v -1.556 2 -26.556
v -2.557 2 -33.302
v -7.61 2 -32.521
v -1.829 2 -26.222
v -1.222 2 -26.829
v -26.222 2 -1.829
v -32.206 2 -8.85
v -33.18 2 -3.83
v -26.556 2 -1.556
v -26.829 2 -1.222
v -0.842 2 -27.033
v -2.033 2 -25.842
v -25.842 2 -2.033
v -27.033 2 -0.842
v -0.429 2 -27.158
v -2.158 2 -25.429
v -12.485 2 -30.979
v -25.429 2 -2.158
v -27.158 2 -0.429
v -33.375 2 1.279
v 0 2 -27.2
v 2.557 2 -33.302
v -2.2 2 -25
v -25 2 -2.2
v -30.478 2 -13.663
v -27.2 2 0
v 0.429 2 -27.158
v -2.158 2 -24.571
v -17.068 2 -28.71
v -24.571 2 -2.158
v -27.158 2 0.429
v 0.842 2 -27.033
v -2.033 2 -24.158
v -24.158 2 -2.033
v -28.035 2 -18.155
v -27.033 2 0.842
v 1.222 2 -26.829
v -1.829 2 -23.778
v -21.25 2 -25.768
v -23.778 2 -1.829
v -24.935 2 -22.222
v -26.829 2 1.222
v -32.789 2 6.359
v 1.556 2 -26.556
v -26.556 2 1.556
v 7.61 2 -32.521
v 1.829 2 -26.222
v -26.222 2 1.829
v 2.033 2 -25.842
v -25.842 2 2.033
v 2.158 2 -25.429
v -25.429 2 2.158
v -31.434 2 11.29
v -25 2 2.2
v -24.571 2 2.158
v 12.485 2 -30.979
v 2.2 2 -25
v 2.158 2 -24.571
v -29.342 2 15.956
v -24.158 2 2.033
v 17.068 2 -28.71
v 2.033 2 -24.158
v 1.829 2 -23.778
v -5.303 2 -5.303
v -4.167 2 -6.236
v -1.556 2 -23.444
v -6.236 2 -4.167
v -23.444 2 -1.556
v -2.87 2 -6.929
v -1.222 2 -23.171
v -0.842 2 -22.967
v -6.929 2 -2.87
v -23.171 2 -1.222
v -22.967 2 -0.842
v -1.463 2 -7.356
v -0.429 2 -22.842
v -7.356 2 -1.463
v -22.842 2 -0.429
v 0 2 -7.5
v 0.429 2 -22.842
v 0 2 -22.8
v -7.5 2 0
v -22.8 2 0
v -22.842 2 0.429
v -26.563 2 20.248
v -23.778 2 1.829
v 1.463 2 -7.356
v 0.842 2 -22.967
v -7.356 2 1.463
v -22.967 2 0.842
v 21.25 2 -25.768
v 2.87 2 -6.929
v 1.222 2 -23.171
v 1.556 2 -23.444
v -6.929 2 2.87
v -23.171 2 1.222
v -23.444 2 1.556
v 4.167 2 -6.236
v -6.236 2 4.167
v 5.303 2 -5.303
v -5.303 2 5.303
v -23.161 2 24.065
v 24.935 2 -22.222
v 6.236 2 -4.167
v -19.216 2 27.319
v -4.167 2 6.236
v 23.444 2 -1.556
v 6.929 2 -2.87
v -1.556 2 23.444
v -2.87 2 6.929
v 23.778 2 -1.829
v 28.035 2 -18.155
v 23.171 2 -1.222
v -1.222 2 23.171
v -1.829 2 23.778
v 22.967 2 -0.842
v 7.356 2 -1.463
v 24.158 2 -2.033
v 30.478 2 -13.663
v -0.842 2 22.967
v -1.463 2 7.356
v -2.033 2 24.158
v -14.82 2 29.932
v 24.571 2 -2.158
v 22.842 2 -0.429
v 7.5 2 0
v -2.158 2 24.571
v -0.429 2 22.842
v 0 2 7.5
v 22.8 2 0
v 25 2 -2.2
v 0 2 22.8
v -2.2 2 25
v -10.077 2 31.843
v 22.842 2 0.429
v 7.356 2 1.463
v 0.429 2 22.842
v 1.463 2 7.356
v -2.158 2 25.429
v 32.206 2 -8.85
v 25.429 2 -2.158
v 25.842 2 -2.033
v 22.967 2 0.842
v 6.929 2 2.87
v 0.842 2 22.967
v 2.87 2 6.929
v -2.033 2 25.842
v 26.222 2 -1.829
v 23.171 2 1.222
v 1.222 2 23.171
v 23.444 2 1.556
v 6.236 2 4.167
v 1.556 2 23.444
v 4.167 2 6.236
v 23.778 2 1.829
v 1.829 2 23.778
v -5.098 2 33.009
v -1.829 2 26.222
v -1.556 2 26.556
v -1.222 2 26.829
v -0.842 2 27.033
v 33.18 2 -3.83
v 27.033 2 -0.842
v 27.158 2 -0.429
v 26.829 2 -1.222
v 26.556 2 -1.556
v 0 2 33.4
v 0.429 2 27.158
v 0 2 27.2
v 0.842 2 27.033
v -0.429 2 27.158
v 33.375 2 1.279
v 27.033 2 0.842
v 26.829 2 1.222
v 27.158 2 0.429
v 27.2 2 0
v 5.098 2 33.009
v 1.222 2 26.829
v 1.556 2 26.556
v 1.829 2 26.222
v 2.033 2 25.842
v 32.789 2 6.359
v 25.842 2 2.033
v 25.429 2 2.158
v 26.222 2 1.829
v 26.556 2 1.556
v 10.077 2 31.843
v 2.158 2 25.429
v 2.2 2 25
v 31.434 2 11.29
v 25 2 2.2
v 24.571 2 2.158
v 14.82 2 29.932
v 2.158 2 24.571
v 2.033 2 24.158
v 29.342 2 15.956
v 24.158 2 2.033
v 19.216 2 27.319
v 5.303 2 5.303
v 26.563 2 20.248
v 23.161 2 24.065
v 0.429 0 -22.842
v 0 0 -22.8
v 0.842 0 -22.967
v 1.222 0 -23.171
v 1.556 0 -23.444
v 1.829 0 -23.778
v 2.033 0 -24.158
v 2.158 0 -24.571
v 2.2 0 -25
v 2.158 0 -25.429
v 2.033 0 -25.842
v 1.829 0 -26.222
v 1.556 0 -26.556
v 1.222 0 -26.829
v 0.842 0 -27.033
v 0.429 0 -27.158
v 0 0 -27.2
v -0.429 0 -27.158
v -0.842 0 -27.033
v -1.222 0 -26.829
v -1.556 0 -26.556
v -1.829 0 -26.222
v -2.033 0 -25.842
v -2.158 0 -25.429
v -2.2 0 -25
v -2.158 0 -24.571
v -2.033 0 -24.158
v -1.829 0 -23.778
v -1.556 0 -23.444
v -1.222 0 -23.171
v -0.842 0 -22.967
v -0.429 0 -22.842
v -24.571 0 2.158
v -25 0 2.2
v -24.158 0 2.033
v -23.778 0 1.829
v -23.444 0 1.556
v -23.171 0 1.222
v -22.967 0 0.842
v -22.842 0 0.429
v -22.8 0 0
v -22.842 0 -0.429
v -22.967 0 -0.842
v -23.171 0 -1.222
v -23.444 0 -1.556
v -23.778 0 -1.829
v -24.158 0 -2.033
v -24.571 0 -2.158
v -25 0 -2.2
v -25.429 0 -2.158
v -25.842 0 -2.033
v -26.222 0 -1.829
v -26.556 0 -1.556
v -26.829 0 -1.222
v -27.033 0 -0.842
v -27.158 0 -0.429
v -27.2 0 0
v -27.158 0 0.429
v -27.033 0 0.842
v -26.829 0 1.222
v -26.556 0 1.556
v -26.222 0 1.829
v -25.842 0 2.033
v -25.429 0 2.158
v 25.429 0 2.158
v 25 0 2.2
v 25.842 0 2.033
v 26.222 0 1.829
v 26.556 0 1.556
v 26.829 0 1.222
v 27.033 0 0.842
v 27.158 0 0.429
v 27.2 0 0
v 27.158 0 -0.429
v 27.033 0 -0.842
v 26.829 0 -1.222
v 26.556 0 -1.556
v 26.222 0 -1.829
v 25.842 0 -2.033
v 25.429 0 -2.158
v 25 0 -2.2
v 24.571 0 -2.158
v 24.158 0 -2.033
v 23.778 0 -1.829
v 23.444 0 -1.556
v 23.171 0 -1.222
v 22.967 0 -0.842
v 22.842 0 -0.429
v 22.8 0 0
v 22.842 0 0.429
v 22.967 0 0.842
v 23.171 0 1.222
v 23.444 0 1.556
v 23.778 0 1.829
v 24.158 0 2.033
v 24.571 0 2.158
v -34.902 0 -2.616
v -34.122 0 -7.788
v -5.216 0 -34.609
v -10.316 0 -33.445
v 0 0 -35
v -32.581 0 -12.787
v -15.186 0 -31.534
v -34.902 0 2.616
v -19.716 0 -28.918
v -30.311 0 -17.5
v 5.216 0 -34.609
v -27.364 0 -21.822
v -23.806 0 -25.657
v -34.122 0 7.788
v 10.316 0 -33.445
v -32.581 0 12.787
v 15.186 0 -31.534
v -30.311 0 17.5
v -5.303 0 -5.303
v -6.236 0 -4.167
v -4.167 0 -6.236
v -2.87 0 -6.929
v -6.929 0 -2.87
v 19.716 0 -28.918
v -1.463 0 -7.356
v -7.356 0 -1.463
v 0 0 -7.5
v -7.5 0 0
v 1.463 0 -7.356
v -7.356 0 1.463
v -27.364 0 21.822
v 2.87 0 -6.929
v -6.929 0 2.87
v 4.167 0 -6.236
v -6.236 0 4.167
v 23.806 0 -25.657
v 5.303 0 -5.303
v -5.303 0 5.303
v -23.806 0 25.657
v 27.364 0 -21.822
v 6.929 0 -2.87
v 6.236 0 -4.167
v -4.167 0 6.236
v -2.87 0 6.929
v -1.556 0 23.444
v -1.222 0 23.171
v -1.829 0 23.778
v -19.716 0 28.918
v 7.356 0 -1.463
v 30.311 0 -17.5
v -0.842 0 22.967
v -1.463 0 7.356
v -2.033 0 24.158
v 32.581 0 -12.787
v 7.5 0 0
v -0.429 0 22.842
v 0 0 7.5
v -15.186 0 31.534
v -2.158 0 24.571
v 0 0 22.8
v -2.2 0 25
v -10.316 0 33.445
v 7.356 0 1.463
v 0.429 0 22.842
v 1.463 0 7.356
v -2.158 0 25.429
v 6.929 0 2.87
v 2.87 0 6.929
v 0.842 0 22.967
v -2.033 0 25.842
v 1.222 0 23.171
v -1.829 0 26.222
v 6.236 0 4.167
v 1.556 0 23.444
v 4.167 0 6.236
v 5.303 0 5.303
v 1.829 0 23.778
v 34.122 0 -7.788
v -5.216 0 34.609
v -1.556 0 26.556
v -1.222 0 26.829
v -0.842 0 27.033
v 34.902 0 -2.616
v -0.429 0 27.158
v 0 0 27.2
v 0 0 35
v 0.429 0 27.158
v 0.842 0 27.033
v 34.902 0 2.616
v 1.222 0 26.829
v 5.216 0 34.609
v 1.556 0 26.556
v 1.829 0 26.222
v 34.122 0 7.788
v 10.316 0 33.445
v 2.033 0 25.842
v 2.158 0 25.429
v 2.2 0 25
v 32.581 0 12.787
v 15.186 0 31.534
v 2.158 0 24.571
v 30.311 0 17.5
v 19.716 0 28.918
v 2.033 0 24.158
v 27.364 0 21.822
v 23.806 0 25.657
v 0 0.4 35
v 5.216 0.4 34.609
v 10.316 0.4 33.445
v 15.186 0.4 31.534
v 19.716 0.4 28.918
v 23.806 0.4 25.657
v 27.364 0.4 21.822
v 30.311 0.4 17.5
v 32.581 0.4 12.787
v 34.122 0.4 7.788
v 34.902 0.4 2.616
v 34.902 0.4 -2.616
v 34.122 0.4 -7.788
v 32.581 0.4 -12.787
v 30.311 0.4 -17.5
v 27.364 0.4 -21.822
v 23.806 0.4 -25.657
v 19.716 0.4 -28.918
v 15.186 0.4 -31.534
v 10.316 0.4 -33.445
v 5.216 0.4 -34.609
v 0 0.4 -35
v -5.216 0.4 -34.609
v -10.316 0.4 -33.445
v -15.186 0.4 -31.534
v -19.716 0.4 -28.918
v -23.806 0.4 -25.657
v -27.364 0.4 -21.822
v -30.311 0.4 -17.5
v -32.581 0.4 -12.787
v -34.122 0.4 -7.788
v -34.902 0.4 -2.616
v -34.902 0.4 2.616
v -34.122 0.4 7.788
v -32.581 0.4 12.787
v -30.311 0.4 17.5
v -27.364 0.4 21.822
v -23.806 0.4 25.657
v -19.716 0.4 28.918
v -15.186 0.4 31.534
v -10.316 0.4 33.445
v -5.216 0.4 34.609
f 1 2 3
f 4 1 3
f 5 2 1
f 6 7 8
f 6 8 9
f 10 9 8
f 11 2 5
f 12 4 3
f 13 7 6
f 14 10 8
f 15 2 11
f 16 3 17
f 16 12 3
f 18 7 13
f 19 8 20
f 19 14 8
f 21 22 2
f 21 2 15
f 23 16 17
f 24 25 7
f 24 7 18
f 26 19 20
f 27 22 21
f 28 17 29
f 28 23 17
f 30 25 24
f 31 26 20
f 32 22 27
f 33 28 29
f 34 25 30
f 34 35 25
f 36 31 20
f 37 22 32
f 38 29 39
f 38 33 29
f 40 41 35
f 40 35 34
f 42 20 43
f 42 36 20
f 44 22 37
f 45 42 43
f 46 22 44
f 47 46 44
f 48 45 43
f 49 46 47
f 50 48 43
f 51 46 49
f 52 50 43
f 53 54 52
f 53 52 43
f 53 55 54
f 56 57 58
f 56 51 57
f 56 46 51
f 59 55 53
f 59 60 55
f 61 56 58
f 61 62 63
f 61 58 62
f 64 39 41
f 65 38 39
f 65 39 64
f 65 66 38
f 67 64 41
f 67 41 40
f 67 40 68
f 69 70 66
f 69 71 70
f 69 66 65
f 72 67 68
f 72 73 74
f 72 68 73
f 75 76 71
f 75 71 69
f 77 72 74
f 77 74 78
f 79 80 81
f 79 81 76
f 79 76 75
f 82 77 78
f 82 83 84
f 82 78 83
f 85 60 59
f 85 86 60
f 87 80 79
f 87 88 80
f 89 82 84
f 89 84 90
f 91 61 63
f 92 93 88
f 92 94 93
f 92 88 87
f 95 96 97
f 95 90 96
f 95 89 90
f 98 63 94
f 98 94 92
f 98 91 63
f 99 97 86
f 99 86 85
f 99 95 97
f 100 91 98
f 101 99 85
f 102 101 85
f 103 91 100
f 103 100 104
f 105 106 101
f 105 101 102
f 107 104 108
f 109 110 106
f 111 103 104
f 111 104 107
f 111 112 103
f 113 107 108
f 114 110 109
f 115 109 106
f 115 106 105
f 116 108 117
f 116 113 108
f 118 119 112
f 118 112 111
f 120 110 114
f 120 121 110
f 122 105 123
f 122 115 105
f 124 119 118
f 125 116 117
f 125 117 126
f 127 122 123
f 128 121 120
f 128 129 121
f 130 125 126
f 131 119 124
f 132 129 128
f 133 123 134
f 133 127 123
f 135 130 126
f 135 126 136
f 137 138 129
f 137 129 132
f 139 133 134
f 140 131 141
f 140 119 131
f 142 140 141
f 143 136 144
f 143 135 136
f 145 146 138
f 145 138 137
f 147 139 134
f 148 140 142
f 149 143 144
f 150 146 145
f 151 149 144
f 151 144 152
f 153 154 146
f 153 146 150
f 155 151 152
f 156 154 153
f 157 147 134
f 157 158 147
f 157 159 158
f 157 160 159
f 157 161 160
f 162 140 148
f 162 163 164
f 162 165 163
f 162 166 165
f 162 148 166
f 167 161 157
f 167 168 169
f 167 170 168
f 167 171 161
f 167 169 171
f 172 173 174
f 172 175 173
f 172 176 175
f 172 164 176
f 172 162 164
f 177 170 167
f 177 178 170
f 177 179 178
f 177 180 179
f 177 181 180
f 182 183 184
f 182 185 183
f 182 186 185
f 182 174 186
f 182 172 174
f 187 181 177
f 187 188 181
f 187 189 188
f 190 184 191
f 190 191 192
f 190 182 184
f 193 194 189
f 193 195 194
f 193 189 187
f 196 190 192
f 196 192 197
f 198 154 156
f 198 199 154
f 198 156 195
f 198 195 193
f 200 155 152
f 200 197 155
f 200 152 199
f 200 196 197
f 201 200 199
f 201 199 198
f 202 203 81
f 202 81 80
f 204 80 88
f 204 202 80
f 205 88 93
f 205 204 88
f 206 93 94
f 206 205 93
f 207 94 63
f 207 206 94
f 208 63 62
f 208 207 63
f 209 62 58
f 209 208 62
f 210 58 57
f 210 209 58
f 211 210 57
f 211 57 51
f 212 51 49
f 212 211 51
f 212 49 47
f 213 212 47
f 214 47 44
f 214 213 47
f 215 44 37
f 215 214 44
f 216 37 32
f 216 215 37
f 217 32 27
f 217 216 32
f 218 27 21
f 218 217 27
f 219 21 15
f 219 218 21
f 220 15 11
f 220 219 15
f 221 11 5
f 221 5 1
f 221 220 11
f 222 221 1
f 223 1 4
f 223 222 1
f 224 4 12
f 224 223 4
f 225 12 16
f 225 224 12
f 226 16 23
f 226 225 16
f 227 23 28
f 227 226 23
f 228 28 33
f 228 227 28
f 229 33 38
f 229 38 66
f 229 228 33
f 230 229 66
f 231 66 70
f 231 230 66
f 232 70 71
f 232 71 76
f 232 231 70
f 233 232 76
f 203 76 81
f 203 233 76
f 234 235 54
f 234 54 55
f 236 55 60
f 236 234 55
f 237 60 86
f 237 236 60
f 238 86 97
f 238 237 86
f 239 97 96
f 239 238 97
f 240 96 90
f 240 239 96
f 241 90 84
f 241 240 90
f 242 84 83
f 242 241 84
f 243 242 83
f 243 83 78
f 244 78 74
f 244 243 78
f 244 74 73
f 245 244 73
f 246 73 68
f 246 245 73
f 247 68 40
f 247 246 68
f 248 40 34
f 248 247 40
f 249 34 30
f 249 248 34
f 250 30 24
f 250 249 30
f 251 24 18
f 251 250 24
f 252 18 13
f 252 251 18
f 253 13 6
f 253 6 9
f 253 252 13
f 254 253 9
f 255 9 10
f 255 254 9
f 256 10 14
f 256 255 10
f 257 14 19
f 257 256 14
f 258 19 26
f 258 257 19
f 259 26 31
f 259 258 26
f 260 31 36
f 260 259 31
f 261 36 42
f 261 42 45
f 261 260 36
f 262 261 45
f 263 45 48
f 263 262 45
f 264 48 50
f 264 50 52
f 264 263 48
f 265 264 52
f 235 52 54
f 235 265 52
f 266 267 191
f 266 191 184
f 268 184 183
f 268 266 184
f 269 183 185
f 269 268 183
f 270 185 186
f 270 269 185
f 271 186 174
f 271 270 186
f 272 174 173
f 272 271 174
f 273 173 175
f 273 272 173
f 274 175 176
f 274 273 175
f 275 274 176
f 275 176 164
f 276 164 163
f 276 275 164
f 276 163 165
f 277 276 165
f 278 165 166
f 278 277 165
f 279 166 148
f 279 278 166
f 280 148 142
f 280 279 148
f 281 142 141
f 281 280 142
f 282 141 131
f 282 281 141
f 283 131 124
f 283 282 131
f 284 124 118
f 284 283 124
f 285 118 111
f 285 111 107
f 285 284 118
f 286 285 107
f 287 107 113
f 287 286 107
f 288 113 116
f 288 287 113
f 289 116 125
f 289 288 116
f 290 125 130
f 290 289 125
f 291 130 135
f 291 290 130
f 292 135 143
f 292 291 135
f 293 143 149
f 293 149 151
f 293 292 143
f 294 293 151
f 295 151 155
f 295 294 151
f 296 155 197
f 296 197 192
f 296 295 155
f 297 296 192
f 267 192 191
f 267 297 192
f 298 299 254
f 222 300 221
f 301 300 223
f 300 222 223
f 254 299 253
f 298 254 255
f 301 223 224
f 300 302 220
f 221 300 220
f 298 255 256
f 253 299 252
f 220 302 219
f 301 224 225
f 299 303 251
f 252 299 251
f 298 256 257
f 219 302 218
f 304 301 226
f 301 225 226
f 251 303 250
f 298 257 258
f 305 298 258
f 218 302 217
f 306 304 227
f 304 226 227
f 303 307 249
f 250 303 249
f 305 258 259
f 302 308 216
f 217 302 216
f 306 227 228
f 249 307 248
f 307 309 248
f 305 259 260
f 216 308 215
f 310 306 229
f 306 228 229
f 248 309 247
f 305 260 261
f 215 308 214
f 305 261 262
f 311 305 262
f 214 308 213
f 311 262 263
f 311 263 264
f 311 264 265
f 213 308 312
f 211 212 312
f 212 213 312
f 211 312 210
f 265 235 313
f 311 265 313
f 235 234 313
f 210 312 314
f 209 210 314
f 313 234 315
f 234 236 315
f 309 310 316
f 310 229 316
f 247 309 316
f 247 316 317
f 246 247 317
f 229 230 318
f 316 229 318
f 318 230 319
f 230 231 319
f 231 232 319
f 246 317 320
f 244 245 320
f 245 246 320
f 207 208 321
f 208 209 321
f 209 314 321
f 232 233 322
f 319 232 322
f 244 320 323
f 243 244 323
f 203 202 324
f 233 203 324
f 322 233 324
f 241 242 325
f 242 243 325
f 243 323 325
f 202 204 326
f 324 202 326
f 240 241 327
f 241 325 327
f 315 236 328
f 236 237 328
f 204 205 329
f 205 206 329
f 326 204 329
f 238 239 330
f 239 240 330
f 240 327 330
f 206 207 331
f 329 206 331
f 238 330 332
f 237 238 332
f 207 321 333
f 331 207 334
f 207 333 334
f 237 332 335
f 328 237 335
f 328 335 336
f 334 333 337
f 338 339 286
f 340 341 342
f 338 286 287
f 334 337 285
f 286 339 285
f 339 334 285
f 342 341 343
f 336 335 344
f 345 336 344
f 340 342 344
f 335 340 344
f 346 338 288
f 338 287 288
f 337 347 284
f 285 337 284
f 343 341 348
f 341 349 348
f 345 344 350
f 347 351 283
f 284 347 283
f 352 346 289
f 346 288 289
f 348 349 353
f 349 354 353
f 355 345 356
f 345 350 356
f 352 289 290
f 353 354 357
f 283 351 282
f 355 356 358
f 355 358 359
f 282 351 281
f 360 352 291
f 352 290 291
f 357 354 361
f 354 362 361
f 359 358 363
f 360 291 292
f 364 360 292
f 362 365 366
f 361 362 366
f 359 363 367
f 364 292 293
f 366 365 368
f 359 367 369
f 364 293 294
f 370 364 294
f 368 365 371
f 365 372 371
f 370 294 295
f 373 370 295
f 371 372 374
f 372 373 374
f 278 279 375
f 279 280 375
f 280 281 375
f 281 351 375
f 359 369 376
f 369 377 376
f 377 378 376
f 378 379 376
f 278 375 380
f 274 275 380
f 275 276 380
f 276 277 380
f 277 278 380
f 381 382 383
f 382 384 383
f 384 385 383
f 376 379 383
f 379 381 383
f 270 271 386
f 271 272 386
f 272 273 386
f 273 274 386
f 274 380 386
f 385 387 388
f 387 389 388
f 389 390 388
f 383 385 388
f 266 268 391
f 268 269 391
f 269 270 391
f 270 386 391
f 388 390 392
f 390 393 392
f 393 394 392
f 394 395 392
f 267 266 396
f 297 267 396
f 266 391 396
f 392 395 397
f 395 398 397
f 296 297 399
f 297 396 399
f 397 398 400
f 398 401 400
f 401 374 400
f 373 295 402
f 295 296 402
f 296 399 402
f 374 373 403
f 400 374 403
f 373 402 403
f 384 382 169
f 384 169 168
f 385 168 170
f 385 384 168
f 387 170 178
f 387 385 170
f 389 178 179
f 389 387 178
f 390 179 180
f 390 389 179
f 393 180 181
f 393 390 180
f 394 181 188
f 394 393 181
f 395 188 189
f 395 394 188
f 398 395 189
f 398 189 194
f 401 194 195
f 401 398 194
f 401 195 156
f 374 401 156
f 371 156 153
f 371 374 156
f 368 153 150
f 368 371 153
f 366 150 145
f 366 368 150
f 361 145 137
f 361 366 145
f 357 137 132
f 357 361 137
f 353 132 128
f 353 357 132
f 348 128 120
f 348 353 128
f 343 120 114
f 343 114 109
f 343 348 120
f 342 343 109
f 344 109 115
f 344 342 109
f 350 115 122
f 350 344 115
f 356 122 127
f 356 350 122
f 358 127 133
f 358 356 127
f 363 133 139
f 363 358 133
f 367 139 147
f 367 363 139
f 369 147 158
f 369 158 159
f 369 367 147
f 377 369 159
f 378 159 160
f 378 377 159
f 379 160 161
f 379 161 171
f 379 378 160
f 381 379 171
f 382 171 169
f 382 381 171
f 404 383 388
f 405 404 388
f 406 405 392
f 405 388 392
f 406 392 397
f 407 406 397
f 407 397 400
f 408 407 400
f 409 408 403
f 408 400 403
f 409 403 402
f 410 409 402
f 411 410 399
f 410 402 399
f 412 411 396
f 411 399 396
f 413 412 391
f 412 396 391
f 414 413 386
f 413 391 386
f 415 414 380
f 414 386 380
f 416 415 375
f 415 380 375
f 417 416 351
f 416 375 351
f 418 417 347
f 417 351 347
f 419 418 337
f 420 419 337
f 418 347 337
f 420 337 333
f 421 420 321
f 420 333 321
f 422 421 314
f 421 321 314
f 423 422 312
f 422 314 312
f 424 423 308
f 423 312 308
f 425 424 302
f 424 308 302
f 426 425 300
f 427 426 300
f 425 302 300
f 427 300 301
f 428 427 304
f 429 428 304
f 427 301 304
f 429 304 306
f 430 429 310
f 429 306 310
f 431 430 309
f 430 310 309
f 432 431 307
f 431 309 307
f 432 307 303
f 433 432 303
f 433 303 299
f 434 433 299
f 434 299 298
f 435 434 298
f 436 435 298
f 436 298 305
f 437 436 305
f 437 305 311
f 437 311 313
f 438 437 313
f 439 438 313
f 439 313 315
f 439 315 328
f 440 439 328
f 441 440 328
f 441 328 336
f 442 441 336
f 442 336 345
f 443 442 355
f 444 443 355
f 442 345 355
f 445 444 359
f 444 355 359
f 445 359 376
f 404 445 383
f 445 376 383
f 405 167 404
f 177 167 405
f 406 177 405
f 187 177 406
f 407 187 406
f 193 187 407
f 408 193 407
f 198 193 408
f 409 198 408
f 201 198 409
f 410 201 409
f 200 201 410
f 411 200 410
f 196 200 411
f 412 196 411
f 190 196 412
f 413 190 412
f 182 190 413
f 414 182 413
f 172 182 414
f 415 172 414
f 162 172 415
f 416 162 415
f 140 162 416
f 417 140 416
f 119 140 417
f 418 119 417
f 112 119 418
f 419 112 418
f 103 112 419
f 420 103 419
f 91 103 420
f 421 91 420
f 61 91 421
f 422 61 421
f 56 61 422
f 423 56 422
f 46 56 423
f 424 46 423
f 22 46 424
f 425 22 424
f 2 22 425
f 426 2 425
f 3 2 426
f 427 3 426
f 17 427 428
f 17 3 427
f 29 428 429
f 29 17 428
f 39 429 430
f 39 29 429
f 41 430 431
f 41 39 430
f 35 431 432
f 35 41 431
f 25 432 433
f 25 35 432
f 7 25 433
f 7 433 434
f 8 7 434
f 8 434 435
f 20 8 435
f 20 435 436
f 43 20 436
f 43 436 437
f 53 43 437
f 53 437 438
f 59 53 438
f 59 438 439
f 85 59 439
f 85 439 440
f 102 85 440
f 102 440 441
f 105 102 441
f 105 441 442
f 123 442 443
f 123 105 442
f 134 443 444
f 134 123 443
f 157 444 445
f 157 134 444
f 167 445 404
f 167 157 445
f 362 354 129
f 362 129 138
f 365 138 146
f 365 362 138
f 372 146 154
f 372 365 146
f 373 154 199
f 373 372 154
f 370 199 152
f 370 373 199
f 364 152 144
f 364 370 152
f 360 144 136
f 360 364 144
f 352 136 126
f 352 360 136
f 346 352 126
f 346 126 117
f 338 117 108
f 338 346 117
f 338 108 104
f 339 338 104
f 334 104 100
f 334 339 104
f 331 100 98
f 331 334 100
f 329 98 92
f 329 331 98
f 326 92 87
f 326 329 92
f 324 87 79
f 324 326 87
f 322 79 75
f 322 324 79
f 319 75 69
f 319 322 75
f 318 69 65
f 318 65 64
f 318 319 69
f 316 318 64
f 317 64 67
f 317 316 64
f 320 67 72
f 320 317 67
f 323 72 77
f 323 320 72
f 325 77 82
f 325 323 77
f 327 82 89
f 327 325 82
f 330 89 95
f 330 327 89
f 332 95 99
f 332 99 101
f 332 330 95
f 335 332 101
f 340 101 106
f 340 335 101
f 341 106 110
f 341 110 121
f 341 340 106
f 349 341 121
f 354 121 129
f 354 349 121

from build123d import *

# Parameters (mm, degrees)
SKETCH1_R           = 35
SKETCH1_R_2         = 2.2
SKETCH1_R_3         = 7.5
BOSS_EXTRUDE1_DEPTH = 2
CHAMFER1_SIZE       = 1.6


with BuildPart() as part:
    # Sketch1 → Boss-Extrude1 (new body)
    with BuildSketch(Plane(origin=(0, 0, 0), x_dir=(1, 0, 0), z_dir=(0, 1, 0))):
        with Locations(Location((0, 0, 0), (0, 0, 270))):
            Circle(SKETCH1_R)
        with Locations(Location((0, 25, 0), (0, 0, 270))):
            Circle(SKETCH1_R_2, mode=Mode.SUBTRACT)
        with Locations(Location((25, 0, 0), (0, 0, 270))):
            Circle(SKETCH1_R_2, mode=Mode.SUBTRACT)
        with Locations(Location((0, -25, 0), (0, 0, 270))):
            Circle(SKETCH1_R_2, mode=Mode.SUBTRACT)
        with Locations(Location((-25, 0, 0), (0, 0, 270))):
            Circle(SKETCH1_R_2, mode=Mode.SUBTRACT)
        with Locations(Location((0, 0, 0), (0, 0, 270))):
            Circle(SKETCH1_R_3, mode=Mode.SUBTRACT)
    extrude(amount=BOSS_EXTRUDE1_DEPTH)

    # Chamfer1
    chamfer1_edges = [part.edges().sort_by_distance(p)[0] for p in [
        (0, 2, -35),
    ]]
    chamfer(chamfer1_edges, length=CHAMFER1_SIZE)


solid = part.part
